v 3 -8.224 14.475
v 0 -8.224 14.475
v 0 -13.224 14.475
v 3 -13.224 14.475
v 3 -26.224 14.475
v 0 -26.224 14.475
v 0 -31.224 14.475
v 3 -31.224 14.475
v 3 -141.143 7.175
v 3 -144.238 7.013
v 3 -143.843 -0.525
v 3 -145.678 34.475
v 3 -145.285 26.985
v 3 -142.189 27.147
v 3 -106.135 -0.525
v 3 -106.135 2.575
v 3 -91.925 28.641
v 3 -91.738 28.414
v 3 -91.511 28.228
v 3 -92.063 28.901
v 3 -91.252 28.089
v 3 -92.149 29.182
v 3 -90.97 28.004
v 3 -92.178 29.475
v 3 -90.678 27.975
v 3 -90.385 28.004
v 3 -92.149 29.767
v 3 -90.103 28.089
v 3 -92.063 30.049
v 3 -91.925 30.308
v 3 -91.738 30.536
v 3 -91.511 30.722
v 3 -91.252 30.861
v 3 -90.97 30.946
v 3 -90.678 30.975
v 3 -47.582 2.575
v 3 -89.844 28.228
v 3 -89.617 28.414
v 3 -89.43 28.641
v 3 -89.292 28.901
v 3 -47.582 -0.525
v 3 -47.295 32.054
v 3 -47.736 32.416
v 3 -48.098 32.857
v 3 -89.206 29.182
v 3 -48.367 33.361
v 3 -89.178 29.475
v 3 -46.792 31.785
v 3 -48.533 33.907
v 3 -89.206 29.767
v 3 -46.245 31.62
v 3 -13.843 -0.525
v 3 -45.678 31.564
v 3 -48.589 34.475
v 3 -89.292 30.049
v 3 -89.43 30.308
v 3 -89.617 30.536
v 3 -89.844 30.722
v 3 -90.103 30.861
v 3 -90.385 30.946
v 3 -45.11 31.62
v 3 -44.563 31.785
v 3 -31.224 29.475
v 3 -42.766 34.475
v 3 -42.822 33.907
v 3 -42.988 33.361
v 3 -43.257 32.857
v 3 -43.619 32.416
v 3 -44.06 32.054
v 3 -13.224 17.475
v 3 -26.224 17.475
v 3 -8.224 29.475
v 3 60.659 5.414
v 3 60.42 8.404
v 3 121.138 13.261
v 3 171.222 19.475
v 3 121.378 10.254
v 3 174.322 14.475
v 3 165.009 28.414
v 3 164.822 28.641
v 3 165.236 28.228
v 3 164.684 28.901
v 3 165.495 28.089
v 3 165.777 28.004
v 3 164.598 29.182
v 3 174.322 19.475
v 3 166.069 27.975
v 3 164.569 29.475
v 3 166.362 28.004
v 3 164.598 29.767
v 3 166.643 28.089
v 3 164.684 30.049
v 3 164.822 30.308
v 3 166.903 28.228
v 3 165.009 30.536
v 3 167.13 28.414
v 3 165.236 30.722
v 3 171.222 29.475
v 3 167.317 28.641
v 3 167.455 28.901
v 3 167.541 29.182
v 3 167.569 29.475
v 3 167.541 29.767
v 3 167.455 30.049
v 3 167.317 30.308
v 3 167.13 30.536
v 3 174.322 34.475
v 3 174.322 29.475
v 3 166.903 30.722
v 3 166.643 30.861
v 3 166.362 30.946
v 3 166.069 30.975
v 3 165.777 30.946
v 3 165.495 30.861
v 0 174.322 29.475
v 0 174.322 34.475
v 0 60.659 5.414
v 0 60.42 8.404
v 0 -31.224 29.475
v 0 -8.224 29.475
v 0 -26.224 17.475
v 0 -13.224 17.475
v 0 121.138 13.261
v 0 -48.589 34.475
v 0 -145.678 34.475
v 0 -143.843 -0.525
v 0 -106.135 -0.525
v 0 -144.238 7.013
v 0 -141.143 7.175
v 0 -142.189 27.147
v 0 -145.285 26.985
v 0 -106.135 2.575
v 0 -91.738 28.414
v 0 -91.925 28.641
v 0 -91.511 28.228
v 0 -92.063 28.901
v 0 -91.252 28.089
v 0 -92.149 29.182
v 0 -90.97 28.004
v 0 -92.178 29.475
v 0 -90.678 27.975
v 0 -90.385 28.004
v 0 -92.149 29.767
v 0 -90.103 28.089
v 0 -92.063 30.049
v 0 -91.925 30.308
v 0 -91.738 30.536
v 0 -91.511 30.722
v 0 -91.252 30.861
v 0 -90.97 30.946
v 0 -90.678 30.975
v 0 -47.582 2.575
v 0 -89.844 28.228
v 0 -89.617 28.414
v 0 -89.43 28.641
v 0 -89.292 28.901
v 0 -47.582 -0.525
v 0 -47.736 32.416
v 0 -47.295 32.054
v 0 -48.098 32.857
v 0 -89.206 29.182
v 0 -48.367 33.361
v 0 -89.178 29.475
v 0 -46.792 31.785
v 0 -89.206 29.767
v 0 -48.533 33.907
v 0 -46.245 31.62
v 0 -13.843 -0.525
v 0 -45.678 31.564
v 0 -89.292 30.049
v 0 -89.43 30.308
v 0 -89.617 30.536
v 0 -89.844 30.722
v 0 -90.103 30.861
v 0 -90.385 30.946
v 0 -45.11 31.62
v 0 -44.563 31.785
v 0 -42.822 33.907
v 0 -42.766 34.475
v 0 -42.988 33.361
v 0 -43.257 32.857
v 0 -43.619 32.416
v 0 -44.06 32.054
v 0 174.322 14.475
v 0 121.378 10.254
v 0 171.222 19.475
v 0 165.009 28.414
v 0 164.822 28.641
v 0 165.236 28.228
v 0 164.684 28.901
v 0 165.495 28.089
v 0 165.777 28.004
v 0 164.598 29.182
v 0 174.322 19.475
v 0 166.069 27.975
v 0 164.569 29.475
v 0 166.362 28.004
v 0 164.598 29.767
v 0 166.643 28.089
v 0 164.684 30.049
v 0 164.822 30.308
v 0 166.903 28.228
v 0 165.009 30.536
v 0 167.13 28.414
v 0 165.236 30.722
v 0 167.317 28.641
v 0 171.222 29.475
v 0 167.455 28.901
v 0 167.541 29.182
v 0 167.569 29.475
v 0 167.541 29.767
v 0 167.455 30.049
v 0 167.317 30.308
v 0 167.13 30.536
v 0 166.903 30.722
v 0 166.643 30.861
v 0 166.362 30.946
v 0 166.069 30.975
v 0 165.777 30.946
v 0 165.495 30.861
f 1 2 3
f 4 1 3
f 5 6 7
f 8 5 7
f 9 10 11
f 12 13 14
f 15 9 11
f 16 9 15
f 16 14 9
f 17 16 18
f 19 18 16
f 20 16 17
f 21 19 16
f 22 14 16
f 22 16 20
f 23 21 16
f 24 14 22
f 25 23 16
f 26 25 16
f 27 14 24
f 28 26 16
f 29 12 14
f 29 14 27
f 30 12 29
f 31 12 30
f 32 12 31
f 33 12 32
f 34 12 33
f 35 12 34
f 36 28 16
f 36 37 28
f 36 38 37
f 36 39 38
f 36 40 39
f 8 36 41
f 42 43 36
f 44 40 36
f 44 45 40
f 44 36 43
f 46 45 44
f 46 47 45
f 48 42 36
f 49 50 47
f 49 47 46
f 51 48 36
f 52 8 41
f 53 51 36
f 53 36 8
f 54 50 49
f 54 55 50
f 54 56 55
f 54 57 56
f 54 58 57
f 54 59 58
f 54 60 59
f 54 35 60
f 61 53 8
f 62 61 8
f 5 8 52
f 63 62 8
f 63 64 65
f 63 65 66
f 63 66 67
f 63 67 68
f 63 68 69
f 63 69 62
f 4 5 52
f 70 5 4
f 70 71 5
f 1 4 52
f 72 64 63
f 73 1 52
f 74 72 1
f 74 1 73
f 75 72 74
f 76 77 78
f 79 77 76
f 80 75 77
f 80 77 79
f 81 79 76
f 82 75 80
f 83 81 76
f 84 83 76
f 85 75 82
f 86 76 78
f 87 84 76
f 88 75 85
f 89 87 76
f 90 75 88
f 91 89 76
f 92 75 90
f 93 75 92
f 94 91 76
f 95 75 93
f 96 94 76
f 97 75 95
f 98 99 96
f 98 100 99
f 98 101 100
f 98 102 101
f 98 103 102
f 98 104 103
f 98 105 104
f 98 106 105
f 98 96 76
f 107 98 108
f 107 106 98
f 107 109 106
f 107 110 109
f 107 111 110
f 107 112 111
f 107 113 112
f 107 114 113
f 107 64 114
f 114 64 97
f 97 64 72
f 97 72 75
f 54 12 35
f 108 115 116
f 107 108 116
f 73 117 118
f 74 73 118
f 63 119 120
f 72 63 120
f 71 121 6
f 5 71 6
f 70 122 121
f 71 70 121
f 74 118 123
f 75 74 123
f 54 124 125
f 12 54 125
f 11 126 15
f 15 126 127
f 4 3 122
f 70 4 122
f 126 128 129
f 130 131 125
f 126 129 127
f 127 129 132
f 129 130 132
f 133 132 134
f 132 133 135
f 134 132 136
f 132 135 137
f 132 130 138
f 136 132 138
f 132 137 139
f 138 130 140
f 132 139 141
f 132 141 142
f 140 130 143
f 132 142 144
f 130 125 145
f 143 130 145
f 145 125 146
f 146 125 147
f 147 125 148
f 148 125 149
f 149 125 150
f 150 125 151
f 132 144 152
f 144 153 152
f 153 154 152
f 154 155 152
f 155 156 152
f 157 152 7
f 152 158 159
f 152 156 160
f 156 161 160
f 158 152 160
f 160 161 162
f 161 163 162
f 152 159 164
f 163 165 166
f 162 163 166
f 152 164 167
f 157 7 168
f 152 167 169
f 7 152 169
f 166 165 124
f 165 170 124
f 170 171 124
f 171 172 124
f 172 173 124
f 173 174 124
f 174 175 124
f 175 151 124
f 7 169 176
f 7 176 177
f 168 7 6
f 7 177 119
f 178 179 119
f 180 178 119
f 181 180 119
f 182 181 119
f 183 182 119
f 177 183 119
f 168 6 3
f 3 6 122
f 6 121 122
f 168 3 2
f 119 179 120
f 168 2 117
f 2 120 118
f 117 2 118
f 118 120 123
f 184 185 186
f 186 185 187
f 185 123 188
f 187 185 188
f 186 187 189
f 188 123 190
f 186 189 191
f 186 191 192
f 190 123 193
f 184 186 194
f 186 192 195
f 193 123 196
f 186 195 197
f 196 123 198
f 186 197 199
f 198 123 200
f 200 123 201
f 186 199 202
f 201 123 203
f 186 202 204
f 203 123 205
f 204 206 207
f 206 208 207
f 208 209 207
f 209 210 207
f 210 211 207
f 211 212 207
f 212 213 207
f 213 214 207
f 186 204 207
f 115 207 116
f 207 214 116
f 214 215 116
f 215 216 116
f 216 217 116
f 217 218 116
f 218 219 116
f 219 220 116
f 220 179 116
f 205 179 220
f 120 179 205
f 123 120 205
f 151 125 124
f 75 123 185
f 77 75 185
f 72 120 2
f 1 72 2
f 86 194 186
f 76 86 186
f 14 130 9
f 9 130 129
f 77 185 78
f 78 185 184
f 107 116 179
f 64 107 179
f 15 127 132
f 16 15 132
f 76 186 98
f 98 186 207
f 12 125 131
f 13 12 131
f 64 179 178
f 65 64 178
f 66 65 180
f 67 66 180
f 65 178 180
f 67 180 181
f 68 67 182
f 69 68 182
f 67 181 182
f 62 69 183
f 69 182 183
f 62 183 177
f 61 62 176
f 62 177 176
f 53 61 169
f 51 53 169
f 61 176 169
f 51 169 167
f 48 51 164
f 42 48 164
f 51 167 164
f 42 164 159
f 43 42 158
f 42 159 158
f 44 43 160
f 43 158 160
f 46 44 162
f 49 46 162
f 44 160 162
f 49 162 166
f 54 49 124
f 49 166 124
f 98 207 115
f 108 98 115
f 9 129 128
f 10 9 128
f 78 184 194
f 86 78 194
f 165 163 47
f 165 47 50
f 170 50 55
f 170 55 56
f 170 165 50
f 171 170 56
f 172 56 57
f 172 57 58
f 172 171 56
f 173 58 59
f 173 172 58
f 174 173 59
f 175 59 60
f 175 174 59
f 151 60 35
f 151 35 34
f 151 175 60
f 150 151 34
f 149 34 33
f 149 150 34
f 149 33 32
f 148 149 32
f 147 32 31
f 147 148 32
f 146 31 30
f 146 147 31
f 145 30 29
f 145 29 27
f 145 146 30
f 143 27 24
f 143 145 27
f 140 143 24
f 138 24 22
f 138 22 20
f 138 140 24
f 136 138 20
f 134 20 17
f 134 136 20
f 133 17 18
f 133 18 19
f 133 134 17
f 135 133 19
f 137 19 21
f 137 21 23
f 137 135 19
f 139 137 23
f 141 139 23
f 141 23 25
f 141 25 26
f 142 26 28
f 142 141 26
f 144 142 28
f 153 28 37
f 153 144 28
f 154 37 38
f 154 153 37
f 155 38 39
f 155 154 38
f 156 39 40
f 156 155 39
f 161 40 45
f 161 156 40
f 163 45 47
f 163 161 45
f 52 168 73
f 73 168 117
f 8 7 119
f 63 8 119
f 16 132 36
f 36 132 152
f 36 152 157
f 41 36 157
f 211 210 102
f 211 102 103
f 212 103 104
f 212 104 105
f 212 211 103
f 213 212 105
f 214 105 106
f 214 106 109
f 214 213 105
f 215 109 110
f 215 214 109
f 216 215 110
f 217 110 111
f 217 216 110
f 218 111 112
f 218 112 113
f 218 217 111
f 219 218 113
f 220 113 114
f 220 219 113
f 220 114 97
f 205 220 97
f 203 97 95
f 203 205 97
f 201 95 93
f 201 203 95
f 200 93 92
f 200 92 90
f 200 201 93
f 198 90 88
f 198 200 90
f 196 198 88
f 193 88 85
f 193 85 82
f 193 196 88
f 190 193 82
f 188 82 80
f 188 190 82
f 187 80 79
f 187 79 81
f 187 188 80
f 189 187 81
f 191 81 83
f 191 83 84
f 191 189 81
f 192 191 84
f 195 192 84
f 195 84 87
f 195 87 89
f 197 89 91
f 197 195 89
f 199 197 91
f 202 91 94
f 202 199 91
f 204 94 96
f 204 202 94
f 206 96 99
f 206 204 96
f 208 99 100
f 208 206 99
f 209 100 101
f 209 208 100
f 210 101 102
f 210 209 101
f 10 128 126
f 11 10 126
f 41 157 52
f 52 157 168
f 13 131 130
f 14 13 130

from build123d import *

# Parameters (mm, degrees)
F0_R     = 1.5
F1_DEPTH = 3


with BuildPart() as f1:
    # F0 (on Right) → F1 (new body)
    with BuildSketch(Plane.YZ):
        with BuildLine():
            Line((-144.238283, 7.012537), (-143.843249, -0.525151))
            Line((-143.843249, -0.525151), (-106.134906, -0.525151))
            Line((-106.134906, -0.525151), (-106.134906, 2.574849))
            Line((-106.134906, 2.574849), (-47.581803, 2.574849))
            Line((-47.581803, 2.574849), (-47.581803, -0.525151))
            Line((-47.581803, -0.525151), (-13.843249, -0.525151))
            Line((-13.843249, -0.525151), (60.658704, 5.413919))
            Line((60.658704, 5.413919), (60.420309, 8.404432))
            Line((60.420309, 8.404432), (121.137942, 13.261014))
            Line((121.137942, 13.261014), (121.377632, 10.254247))
            Line((121.377632, 10.254247), (174.322478, 14.474849))
            Line((174.322478, 14.474849), (174.322478, 19.474849))
            Line((174.322478, 19.474849), (171.222478, 19.474849))
            Line((171.222478, 19.474849), (171.222478, 29.474849))
            Line((171.222478, 29.474849), (174.322478, 29.474849))
            Line((174.322478, 29.474849), (174.322478, 34.474849))
            Line((174.322478, 34.474849), (164.322478, 34.474849))
            Line((164.322478, 34.474849), (-42.766357, 34.474849))
            ThreePointArc((-42.766357, 34.474849), (-45.677522, 31.563684), (-48.588687, 34.474849))
            Line((-48.588687, 34.474849), (-85.677522, 34.474849))
            Line((-85.677522, 34.474849), (-145.677522, 34.474849))
            Line((-145.677522, 34.474849), (-145.285002, 26.985128))
            Line((-145.285002, 26.985128), (-142.189251, 27.147369))
            Line((-142.189251, 27.147369), (-141.142531, 7.174779))
            Line((-141.142531, 7.174779), (-144.238283, 7.012537))
        make_face()
        Polygon((-31.22394, 17.474849), (-31.22394, 29.474849), (-8.22394, 29.474849), (-8.22394, 17.474849), (-8.22394, 14.474849), (-13.22394, 14.474849), (-13.22394, 17.474849), (-26.22394, 17.474849), (-26.22394, 14.474849), (-31.22394, 14.474849), align=None, mode=Mode.SUBTRACT)
        with Locations((-90.677522, 29.474849)):
            Circle(F0_R, mode=Mode.SUBTRACT)
        with Locations((166.069406, 29.474849)):
            Circle(F0_R, mode=Mode.SUBTRACT)
    extrude(amount=F1_DEPTH)


solid = f1.part
